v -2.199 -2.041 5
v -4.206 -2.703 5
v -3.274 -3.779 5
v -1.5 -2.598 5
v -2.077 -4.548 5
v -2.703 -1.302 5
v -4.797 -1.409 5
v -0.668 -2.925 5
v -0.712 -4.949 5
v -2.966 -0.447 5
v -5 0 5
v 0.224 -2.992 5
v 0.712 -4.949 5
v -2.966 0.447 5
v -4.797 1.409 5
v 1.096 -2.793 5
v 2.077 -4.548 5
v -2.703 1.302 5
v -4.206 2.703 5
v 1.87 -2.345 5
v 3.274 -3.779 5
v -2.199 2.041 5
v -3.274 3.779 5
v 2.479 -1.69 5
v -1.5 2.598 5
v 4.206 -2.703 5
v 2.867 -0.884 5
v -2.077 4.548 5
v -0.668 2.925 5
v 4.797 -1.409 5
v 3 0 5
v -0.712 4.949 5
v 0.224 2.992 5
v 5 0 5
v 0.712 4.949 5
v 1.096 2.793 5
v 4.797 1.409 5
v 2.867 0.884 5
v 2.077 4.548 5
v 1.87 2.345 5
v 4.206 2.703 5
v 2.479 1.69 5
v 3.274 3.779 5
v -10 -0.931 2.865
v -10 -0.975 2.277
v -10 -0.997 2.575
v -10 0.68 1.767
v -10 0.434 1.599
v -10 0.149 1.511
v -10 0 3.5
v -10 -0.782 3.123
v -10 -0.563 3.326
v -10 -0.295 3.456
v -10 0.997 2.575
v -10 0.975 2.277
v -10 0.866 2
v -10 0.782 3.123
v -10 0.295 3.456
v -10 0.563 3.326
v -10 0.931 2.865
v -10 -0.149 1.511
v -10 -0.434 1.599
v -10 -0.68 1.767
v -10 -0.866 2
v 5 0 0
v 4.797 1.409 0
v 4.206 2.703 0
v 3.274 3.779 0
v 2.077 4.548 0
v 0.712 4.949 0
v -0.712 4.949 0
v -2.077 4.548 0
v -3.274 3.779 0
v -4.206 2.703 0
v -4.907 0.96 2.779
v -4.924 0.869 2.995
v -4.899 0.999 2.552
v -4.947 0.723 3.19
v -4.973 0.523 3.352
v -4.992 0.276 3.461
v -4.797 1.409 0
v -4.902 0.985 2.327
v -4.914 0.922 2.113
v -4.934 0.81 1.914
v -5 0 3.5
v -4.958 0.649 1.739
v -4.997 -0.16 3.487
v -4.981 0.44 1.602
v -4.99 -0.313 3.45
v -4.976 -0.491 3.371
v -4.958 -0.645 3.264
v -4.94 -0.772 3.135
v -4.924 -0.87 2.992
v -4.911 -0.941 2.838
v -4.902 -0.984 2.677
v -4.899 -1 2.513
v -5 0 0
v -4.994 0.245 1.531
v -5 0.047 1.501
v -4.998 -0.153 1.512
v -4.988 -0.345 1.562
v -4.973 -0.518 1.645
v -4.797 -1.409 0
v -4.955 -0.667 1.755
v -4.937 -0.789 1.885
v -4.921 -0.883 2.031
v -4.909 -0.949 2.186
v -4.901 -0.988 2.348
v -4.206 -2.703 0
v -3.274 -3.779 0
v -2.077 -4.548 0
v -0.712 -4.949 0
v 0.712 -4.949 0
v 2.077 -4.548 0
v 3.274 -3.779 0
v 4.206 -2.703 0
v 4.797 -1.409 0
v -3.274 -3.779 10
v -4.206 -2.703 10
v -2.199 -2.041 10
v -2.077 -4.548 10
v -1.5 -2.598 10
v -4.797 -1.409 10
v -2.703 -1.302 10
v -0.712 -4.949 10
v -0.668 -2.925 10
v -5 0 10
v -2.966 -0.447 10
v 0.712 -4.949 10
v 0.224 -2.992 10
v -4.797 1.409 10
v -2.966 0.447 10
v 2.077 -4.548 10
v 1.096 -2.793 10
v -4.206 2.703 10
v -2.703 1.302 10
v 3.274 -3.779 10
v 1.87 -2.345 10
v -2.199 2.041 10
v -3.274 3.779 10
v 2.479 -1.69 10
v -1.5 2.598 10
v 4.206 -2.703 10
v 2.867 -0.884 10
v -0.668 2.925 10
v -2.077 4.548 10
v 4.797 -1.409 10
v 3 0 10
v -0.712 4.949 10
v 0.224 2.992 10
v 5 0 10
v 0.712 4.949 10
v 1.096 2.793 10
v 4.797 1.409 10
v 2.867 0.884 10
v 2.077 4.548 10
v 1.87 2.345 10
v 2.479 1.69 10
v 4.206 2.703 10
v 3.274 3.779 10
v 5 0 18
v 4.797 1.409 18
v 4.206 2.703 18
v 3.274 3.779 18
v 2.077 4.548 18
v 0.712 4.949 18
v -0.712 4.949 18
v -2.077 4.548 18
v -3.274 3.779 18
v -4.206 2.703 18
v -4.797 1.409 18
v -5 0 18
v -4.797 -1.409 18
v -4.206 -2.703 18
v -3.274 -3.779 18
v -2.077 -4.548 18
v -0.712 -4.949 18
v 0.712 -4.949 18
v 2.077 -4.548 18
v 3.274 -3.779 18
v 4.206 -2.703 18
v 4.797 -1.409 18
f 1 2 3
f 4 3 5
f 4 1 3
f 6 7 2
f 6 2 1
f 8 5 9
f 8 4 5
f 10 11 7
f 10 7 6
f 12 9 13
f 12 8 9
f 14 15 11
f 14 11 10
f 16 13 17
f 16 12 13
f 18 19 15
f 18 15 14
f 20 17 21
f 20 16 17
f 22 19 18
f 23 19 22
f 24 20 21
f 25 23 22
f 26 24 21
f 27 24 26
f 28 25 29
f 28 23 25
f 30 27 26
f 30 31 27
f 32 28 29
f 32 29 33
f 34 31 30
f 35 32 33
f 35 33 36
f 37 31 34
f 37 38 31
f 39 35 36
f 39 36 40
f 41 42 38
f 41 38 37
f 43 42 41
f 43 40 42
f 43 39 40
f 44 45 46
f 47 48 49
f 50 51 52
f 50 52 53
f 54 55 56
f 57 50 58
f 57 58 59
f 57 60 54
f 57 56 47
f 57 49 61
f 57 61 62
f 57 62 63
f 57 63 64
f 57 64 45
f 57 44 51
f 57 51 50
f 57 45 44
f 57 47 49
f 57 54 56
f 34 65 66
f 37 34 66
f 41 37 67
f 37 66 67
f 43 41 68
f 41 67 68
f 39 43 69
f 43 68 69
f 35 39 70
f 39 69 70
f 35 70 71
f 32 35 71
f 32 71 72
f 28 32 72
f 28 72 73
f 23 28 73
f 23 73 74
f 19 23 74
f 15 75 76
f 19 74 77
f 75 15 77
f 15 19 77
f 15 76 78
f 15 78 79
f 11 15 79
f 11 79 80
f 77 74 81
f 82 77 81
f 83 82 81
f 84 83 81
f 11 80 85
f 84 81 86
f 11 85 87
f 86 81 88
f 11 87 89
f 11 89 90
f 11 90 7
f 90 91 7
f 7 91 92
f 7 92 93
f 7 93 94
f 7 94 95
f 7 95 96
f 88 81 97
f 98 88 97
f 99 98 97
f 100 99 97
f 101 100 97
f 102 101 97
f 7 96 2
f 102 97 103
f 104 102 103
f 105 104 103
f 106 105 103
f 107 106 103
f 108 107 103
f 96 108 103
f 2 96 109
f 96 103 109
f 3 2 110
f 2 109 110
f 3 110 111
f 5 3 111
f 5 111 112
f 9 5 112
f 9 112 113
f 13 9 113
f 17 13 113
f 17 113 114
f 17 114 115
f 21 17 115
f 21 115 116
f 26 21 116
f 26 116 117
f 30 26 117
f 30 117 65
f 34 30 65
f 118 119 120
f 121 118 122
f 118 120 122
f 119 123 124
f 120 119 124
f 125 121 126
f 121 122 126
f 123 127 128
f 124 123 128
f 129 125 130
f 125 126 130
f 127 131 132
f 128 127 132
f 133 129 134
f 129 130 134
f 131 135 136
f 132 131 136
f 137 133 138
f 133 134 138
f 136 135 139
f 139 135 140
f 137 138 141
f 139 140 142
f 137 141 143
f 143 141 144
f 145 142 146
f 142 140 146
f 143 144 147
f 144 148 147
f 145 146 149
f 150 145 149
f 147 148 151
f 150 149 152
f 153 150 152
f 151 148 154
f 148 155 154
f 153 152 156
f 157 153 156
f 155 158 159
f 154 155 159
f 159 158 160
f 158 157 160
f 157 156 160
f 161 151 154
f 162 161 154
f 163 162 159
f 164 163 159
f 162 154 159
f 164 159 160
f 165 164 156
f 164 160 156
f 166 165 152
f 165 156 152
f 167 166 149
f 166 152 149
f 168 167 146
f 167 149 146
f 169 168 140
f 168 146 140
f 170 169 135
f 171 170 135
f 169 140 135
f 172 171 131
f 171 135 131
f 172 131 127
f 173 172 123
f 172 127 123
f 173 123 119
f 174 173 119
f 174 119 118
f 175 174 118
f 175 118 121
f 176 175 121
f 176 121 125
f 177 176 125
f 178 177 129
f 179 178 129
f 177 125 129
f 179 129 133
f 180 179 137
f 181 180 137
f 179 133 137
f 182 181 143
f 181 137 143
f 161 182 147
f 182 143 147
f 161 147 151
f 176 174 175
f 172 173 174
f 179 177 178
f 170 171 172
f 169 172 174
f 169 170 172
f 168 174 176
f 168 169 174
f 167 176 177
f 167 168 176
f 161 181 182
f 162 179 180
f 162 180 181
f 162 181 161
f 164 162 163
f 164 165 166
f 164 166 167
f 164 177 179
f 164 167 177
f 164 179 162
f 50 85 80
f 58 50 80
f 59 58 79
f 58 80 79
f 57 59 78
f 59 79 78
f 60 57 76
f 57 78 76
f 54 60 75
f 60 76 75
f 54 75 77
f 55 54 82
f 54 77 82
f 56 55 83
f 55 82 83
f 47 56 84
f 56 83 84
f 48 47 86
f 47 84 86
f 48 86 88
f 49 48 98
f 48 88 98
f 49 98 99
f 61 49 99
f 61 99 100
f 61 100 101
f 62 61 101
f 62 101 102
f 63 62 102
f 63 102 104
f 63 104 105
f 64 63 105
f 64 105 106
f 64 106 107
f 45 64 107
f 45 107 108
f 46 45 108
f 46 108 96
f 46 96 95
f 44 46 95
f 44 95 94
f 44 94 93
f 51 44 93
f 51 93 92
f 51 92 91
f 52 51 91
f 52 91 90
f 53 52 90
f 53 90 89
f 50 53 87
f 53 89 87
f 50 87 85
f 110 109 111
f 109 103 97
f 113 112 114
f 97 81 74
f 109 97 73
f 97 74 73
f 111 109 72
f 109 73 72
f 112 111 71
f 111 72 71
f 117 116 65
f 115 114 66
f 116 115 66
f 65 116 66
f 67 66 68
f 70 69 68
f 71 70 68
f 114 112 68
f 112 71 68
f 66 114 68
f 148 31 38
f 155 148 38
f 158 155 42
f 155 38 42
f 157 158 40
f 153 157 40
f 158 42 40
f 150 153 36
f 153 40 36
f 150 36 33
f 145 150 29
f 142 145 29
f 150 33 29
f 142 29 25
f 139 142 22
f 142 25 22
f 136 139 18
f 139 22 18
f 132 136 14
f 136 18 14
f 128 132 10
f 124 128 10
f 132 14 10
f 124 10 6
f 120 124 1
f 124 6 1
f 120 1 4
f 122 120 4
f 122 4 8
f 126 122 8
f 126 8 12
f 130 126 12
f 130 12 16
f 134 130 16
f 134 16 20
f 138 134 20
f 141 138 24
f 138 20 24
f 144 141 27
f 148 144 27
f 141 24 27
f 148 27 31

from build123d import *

# Parameters (mm, degrees)
SKETCH2_R           = 5
BOSS_EXTRUDE1_DEPTH = 5
SKETCH3_R           = 3
BOSS_EXTRUDE2_DEPTH = 5
SKETCH4_R           = 5
BOSS_EXTRUDE3_DEPTH = 8
SKETCH5_R           = 1
BOSS_EXTRUDE4_DEPTH = 10


with BuildPart() as part:
    # Sketch2 → Boss-Extrude1 (new body)
    with BuildSketch(Plane.XY):
        Circle(SKETCH2_R)
    extrude(amount=BOSS_EXTRUDE1_DEPTH)

    # Sketch3 → Boss-Extrude2 (add)
    with BuildSketch(Plane.XY.offset(5)):
        Circle(SKETCH3_R)
    extrude(amount=BOSS_EXTRUDE2_DEPTH)

    # Sketch4 → Boss-Extrude3 (add)
    with BuildSketch(Plane.XY.offset(10)):
        Circle(SKETCH4_R)
    extrude(amount=BOSS_EXTRUDE3_DEPTH)

    # Sketch5 → Boss-Extrude4 (add)
    with BuildSketch(Plane.ZY):
        with Locations((2.5, 0)):
            Circle(SKETCH5_R)
    extrude(amount=BOSS_EXTRUDE4_DEPTH)


solid = part.part
